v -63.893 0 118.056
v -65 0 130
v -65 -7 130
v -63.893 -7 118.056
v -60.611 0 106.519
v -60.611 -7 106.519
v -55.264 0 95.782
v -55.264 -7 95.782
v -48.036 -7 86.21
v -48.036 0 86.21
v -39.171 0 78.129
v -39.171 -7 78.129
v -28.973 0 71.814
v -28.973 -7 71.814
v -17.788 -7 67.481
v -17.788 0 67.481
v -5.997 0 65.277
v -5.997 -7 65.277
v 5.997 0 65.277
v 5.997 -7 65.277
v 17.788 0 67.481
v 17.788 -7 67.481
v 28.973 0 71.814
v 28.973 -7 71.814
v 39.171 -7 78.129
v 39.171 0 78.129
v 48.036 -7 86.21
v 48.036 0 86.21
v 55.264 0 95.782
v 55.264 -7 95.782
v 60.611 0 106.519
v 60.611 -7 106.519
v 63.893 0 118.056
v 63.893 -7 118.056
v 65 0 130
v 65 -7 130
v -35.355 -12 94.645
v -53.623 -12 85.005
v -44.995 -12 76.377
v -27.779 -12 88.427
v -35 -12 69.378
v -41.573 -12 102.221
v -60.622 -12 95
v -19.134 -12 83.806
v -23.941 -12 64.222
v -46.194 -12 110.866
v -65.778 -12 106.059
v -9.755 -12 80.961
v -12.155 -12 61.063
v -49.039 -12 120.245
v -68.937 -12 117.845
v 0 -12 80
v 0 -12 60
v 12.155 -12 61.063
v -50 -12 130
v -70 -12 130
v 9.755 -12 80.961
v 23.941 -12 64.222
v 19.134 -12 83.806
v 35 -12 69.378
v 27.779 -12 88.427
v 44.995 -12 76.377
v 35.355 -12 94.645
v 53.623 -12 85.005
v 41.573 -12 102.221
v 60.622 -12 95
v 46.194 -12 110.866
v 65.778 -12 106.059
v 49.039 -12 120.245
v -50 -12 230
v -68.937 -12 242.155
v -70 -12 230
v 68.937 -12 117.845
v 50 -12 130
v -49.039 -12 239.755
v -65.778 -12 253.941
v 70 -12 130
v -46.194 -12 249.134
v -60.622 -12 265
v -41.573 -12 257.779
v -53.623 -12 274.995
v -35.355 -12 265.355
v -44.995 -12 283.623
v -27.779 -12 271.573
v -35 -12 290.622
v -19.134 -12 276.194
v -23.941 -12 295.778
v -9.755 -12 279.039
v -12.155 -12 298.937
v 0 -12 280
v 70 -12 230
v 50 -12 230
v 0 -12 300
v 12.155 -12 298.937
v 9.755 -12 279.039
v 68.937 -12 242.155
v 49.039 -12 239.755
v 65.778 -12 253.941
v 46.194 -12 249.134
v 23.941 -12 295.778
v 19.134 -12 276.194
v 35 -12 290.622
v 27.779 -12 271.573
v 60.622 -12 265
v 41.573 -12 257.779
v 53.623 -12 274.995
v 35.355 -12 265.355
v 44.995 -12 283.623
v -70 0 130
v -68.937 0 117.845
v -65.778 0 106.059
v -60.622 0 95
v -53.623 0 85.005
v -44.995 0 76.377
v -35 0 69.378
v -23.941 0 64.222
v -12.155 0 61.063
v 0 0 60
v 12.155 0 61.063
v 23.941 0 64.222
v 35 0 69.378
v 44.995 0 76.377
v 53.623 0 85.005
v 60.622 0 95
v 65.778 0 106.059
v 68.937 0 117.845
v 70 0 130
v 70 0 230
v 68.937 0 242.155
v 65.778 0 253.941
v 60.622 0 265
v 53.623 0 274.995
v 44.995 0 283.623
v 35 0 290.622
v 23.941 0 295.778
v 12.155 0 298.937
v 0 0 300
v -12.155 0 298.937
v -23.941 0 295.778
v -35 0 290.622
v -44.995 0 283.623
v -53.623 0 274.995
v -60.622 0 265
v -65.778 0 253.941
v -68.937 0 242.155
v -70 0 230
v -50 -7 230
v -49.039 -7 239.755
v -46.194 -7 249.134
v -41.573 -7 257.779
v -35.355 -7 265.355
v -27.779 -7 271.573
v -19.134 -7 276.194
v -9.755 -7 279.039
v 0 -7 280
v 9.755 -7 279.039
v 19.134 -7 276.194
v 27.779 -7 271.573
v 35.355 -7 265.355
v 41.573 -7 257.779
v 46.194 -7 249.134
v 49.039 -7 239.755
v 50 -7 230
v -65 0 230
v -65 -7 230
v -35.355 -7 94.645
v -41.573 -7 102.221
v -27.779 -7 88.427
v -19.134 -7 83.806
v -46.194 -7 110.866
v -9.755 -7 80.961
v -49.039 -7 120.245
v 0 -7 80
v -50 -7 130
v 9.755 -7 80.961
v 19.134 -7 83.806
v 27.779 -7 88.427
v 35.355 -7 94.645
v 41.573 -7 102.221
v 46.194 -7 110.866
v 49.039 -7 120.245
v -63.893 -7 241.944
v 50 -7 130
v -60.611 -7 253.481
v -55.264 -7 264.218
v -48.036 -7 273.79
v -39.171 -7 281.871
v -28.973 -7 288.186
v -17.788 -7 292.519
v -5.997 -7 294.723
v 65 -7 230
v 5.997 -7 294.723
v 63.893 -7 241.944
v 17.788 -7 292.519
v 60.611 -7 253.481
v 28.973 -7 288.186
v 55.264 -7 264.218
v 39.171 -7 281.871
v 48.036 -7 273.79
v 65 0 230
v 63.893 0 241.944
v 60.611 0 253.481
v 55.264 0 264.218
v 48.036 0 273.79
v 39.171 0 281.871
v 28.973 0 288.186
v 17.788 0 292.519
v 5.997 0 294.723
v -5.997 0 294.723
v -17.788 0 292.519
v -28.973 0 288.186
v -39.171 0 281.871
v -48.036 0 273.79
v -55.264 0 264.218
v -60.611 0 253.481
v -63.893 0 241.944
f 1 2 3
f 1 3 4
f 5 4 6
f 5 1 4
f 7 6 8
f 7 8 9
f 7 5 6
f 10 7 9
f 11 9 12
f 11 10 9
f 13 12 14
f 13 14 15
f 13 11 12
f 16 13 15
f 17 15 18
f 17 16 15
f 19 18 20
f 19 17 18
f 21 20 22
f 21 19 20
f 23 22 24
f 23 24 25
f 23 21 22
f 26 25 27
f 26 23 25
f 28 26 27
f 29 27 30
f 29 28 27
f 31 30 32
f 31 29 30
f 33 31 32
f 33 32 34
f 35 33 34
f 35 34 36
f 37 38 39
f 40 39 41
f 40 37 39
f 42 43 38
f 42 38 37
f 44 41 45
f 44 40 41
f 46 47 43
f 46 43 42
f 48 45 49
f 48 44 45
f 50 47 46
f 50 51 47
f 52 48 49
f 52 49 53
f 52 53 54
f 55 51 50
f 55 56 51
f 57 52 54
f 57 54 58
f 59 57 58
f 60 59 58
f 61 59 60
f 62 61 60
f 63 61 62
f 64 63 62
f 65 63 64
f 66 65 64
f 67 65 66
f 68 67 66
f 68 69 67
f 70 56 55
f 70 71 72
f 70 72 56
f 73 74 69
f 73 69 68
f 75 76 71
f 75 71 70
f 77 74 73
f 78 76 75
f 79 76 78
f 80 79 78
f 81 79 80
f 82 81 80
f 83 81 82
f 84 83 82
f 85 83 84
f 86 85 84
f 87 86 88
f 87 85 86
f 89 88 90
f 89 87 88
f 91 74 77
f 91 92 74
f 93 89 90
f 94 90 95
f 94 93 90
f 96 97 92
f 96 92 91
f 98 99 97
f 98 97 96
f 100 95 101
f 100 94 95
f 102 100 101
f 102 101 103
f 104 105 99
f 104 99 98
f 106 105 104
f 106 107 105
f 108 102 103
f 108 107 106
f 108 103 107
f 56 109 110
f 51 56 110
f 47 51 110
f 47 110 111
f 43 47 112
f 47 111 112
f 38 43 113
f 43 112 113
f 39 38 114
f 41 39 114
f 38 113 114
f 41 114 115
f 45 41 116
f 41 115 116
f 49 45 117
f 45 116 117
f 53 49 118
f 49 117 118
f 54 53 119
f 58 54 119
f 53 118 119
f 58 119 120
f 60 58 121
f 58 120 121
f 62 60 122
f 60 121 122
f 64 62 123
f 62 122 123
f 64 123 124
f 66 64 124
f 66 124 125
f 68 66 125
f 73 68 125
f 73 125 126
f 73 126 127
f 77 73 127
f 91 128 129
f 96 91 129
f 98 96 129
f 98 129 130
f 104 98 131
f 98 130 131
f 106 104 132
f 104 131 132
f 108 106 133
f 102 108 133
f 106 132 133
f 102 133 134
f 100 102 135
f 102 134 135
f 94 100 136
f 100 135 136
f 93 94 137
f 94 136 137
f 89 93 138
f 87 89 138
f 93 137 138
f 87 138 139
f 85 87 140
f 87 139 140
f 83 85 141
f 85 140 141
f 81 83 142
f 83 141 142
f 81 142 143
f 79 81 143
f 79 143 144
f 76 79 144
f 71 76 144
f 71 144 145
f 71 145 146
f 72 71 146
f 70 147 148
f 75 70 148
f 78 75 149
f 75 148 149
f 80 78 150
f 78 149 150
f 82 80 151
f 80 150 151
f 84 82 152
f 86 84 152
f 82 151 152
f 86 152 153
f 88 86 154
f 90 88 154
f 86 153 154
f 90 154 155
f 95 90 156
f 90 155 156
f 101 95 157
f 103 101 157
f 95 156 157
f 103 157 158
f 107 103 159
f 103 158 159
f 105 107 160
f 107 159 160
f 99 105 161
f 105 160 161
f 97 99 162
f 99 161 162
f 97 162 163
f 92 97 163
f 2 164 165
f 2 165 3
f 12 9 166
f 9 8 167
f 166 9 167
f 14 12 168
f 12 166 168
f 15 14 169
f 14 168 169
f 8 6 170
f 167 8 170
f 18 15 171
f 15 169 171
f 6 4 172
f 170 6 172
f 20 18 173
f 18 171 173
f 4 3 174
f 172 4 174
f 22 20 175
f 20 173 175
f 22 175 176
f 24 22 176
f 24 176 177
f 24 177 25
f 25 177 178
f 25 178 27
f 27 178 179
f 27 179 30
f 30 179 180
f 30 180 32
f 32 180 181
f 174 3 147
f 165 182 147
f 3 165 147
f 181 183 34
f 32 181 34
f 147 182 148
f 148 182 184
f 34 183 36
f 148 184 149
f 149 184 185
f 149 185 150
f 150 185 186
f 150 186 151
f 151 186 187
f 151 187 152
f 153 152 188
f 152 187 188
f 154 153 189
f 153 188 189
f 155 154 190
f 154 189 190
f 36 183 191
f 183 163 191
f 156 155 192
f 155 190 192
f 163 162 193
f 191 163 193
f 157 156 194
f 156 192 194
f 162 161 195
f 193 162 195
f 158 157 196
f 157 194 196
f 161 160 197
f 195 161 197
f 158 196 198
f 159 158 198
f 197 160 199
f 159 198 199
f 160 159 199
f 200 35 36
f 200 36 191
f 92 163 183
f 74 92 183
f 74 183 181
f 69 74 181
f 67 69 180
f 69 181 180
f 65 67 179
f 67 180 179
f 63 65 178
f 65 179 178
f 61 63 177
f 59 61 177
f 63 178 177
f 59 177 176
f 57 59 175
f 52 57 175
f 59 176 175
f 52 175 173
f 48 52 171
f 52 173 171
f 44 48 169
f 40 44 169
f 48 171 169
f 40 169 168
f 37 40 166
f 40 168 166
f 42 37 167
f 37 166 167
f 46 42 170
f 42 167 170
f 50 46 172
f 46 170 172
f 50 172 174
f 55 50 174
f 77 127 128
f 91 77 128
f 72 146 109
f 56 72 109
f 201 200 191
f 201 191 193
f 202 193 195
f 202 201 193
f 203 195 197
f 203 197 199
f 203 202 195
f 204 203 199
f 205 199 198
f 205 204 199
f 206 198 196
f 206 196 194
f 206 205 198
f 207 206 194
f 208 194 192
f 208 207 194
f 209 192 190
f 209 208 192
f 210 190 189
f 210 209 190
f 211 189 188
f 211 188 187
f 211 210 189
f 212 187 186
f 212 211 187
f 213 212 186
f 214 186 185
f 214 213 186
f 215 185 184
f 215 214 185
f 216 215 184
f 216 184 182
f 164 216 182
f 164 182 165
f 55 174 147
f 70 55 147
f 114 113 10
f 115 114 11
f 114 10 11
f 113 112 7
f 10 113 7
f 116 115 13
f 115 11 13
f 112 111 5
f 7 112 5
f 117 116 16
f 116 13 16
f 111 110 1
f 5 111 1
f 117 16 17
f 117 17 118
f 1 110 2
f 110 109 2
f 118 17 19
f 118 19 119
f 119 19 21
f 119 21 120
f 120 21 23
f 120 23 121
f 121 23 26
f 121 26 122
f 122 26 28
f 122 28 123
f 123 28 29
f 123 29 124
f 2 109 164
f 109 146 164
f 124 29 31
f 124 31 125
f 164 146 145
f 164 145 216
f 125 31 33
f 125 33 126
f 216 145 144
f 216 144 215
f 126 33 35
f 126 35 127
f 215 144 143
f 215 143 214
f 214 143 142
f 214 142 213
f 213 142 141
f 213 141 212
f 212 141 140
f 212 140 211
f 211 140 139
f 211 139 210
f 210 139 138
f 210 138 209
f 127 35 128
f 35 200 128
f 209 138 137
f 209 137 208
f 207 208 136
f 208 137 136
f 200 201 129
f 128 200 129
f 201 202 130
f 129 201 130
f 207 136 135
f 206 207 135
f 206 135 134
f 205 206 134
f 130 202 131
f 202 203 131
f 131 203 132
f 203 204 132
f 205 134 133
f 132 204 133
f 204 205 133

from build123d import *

# Parameters (mm, degrees)
F1_DEPTH = 12
F2_DEPTH = 7


# Not quite as in the source:
# - a feature of the source that left no trace in its solid (it failed there, or was rolled back) is left out


with BuildPart() as f1:
    # F0 (on Front) → F1 (new body)
    with BuildSketch(Plane.XZ):
        with BuildLine():
            Line((70, 130), (70, 230))
            ThreePointArc((70, 230), (0, 300), (-70, 230))
            Line((-70, 230), (-70, 130))
            ThreePointArc((-70, 130), (0, 60), (70, 130))
        make_face()
        with BuildLine():
            Line((-65, 130), (-65, 230))
            ThreePointArc((-65, 230), (0, 295), (65, 230))
            Line((65, 230), (65, 130))
            ThreePointArc((65, 130), (0, 65), (-65, 130))
        make_face(mode=Mode.SUBTRACT)
        with BuildLine():
            ThreePointArc((65, 230), (0, 295), (-65, 230))
            Line((-65, 230), (-65, 130))
            ThreePointArc((-65, 130), (0, 65), (65, 130))
            Line((65, 130), (65, 230))
        make_face()
        with BuildLine():
            Line((-50, 130), (-50, 230))
            ThreePointArc((-50, 230), (0, 280), (50, 230))
            Line((50, 230), (50, 130))
            ThreePointArc((50, 130), (0, 80), (-50, 130))
        make_face(mode=Mode.SUBTRACT)
    extrude(amount=F1_DEPTH)

    # F0 (on Front) → F2 (cut)
    with BuildSketch(Plane.XZ):
        with BuildLine():
            ThreePointArc((65, 230), (0, 295), (-65, 230))
            Line((-65, 230), (-65, 130))
            ThreePointArc((-65, 130), (0, 65), (65, 130))
            Line((65, 130), (65, 230))
        make_face()
        with BuildLine():
            Line((-50, 130), (-50, 230))
            ThreePointArc((-50, 230), (0, 280), (50, 230))
            Line((50, 230), (50, 130))
            ThreePointArc((50, 130), (0, 80), (-50, 130))
        make_face(mode=Mode.SUBTRACT)
    extrude(amount=F2_DEPTH, mode=Mode.SUBTRACT)


solid = f1.part
